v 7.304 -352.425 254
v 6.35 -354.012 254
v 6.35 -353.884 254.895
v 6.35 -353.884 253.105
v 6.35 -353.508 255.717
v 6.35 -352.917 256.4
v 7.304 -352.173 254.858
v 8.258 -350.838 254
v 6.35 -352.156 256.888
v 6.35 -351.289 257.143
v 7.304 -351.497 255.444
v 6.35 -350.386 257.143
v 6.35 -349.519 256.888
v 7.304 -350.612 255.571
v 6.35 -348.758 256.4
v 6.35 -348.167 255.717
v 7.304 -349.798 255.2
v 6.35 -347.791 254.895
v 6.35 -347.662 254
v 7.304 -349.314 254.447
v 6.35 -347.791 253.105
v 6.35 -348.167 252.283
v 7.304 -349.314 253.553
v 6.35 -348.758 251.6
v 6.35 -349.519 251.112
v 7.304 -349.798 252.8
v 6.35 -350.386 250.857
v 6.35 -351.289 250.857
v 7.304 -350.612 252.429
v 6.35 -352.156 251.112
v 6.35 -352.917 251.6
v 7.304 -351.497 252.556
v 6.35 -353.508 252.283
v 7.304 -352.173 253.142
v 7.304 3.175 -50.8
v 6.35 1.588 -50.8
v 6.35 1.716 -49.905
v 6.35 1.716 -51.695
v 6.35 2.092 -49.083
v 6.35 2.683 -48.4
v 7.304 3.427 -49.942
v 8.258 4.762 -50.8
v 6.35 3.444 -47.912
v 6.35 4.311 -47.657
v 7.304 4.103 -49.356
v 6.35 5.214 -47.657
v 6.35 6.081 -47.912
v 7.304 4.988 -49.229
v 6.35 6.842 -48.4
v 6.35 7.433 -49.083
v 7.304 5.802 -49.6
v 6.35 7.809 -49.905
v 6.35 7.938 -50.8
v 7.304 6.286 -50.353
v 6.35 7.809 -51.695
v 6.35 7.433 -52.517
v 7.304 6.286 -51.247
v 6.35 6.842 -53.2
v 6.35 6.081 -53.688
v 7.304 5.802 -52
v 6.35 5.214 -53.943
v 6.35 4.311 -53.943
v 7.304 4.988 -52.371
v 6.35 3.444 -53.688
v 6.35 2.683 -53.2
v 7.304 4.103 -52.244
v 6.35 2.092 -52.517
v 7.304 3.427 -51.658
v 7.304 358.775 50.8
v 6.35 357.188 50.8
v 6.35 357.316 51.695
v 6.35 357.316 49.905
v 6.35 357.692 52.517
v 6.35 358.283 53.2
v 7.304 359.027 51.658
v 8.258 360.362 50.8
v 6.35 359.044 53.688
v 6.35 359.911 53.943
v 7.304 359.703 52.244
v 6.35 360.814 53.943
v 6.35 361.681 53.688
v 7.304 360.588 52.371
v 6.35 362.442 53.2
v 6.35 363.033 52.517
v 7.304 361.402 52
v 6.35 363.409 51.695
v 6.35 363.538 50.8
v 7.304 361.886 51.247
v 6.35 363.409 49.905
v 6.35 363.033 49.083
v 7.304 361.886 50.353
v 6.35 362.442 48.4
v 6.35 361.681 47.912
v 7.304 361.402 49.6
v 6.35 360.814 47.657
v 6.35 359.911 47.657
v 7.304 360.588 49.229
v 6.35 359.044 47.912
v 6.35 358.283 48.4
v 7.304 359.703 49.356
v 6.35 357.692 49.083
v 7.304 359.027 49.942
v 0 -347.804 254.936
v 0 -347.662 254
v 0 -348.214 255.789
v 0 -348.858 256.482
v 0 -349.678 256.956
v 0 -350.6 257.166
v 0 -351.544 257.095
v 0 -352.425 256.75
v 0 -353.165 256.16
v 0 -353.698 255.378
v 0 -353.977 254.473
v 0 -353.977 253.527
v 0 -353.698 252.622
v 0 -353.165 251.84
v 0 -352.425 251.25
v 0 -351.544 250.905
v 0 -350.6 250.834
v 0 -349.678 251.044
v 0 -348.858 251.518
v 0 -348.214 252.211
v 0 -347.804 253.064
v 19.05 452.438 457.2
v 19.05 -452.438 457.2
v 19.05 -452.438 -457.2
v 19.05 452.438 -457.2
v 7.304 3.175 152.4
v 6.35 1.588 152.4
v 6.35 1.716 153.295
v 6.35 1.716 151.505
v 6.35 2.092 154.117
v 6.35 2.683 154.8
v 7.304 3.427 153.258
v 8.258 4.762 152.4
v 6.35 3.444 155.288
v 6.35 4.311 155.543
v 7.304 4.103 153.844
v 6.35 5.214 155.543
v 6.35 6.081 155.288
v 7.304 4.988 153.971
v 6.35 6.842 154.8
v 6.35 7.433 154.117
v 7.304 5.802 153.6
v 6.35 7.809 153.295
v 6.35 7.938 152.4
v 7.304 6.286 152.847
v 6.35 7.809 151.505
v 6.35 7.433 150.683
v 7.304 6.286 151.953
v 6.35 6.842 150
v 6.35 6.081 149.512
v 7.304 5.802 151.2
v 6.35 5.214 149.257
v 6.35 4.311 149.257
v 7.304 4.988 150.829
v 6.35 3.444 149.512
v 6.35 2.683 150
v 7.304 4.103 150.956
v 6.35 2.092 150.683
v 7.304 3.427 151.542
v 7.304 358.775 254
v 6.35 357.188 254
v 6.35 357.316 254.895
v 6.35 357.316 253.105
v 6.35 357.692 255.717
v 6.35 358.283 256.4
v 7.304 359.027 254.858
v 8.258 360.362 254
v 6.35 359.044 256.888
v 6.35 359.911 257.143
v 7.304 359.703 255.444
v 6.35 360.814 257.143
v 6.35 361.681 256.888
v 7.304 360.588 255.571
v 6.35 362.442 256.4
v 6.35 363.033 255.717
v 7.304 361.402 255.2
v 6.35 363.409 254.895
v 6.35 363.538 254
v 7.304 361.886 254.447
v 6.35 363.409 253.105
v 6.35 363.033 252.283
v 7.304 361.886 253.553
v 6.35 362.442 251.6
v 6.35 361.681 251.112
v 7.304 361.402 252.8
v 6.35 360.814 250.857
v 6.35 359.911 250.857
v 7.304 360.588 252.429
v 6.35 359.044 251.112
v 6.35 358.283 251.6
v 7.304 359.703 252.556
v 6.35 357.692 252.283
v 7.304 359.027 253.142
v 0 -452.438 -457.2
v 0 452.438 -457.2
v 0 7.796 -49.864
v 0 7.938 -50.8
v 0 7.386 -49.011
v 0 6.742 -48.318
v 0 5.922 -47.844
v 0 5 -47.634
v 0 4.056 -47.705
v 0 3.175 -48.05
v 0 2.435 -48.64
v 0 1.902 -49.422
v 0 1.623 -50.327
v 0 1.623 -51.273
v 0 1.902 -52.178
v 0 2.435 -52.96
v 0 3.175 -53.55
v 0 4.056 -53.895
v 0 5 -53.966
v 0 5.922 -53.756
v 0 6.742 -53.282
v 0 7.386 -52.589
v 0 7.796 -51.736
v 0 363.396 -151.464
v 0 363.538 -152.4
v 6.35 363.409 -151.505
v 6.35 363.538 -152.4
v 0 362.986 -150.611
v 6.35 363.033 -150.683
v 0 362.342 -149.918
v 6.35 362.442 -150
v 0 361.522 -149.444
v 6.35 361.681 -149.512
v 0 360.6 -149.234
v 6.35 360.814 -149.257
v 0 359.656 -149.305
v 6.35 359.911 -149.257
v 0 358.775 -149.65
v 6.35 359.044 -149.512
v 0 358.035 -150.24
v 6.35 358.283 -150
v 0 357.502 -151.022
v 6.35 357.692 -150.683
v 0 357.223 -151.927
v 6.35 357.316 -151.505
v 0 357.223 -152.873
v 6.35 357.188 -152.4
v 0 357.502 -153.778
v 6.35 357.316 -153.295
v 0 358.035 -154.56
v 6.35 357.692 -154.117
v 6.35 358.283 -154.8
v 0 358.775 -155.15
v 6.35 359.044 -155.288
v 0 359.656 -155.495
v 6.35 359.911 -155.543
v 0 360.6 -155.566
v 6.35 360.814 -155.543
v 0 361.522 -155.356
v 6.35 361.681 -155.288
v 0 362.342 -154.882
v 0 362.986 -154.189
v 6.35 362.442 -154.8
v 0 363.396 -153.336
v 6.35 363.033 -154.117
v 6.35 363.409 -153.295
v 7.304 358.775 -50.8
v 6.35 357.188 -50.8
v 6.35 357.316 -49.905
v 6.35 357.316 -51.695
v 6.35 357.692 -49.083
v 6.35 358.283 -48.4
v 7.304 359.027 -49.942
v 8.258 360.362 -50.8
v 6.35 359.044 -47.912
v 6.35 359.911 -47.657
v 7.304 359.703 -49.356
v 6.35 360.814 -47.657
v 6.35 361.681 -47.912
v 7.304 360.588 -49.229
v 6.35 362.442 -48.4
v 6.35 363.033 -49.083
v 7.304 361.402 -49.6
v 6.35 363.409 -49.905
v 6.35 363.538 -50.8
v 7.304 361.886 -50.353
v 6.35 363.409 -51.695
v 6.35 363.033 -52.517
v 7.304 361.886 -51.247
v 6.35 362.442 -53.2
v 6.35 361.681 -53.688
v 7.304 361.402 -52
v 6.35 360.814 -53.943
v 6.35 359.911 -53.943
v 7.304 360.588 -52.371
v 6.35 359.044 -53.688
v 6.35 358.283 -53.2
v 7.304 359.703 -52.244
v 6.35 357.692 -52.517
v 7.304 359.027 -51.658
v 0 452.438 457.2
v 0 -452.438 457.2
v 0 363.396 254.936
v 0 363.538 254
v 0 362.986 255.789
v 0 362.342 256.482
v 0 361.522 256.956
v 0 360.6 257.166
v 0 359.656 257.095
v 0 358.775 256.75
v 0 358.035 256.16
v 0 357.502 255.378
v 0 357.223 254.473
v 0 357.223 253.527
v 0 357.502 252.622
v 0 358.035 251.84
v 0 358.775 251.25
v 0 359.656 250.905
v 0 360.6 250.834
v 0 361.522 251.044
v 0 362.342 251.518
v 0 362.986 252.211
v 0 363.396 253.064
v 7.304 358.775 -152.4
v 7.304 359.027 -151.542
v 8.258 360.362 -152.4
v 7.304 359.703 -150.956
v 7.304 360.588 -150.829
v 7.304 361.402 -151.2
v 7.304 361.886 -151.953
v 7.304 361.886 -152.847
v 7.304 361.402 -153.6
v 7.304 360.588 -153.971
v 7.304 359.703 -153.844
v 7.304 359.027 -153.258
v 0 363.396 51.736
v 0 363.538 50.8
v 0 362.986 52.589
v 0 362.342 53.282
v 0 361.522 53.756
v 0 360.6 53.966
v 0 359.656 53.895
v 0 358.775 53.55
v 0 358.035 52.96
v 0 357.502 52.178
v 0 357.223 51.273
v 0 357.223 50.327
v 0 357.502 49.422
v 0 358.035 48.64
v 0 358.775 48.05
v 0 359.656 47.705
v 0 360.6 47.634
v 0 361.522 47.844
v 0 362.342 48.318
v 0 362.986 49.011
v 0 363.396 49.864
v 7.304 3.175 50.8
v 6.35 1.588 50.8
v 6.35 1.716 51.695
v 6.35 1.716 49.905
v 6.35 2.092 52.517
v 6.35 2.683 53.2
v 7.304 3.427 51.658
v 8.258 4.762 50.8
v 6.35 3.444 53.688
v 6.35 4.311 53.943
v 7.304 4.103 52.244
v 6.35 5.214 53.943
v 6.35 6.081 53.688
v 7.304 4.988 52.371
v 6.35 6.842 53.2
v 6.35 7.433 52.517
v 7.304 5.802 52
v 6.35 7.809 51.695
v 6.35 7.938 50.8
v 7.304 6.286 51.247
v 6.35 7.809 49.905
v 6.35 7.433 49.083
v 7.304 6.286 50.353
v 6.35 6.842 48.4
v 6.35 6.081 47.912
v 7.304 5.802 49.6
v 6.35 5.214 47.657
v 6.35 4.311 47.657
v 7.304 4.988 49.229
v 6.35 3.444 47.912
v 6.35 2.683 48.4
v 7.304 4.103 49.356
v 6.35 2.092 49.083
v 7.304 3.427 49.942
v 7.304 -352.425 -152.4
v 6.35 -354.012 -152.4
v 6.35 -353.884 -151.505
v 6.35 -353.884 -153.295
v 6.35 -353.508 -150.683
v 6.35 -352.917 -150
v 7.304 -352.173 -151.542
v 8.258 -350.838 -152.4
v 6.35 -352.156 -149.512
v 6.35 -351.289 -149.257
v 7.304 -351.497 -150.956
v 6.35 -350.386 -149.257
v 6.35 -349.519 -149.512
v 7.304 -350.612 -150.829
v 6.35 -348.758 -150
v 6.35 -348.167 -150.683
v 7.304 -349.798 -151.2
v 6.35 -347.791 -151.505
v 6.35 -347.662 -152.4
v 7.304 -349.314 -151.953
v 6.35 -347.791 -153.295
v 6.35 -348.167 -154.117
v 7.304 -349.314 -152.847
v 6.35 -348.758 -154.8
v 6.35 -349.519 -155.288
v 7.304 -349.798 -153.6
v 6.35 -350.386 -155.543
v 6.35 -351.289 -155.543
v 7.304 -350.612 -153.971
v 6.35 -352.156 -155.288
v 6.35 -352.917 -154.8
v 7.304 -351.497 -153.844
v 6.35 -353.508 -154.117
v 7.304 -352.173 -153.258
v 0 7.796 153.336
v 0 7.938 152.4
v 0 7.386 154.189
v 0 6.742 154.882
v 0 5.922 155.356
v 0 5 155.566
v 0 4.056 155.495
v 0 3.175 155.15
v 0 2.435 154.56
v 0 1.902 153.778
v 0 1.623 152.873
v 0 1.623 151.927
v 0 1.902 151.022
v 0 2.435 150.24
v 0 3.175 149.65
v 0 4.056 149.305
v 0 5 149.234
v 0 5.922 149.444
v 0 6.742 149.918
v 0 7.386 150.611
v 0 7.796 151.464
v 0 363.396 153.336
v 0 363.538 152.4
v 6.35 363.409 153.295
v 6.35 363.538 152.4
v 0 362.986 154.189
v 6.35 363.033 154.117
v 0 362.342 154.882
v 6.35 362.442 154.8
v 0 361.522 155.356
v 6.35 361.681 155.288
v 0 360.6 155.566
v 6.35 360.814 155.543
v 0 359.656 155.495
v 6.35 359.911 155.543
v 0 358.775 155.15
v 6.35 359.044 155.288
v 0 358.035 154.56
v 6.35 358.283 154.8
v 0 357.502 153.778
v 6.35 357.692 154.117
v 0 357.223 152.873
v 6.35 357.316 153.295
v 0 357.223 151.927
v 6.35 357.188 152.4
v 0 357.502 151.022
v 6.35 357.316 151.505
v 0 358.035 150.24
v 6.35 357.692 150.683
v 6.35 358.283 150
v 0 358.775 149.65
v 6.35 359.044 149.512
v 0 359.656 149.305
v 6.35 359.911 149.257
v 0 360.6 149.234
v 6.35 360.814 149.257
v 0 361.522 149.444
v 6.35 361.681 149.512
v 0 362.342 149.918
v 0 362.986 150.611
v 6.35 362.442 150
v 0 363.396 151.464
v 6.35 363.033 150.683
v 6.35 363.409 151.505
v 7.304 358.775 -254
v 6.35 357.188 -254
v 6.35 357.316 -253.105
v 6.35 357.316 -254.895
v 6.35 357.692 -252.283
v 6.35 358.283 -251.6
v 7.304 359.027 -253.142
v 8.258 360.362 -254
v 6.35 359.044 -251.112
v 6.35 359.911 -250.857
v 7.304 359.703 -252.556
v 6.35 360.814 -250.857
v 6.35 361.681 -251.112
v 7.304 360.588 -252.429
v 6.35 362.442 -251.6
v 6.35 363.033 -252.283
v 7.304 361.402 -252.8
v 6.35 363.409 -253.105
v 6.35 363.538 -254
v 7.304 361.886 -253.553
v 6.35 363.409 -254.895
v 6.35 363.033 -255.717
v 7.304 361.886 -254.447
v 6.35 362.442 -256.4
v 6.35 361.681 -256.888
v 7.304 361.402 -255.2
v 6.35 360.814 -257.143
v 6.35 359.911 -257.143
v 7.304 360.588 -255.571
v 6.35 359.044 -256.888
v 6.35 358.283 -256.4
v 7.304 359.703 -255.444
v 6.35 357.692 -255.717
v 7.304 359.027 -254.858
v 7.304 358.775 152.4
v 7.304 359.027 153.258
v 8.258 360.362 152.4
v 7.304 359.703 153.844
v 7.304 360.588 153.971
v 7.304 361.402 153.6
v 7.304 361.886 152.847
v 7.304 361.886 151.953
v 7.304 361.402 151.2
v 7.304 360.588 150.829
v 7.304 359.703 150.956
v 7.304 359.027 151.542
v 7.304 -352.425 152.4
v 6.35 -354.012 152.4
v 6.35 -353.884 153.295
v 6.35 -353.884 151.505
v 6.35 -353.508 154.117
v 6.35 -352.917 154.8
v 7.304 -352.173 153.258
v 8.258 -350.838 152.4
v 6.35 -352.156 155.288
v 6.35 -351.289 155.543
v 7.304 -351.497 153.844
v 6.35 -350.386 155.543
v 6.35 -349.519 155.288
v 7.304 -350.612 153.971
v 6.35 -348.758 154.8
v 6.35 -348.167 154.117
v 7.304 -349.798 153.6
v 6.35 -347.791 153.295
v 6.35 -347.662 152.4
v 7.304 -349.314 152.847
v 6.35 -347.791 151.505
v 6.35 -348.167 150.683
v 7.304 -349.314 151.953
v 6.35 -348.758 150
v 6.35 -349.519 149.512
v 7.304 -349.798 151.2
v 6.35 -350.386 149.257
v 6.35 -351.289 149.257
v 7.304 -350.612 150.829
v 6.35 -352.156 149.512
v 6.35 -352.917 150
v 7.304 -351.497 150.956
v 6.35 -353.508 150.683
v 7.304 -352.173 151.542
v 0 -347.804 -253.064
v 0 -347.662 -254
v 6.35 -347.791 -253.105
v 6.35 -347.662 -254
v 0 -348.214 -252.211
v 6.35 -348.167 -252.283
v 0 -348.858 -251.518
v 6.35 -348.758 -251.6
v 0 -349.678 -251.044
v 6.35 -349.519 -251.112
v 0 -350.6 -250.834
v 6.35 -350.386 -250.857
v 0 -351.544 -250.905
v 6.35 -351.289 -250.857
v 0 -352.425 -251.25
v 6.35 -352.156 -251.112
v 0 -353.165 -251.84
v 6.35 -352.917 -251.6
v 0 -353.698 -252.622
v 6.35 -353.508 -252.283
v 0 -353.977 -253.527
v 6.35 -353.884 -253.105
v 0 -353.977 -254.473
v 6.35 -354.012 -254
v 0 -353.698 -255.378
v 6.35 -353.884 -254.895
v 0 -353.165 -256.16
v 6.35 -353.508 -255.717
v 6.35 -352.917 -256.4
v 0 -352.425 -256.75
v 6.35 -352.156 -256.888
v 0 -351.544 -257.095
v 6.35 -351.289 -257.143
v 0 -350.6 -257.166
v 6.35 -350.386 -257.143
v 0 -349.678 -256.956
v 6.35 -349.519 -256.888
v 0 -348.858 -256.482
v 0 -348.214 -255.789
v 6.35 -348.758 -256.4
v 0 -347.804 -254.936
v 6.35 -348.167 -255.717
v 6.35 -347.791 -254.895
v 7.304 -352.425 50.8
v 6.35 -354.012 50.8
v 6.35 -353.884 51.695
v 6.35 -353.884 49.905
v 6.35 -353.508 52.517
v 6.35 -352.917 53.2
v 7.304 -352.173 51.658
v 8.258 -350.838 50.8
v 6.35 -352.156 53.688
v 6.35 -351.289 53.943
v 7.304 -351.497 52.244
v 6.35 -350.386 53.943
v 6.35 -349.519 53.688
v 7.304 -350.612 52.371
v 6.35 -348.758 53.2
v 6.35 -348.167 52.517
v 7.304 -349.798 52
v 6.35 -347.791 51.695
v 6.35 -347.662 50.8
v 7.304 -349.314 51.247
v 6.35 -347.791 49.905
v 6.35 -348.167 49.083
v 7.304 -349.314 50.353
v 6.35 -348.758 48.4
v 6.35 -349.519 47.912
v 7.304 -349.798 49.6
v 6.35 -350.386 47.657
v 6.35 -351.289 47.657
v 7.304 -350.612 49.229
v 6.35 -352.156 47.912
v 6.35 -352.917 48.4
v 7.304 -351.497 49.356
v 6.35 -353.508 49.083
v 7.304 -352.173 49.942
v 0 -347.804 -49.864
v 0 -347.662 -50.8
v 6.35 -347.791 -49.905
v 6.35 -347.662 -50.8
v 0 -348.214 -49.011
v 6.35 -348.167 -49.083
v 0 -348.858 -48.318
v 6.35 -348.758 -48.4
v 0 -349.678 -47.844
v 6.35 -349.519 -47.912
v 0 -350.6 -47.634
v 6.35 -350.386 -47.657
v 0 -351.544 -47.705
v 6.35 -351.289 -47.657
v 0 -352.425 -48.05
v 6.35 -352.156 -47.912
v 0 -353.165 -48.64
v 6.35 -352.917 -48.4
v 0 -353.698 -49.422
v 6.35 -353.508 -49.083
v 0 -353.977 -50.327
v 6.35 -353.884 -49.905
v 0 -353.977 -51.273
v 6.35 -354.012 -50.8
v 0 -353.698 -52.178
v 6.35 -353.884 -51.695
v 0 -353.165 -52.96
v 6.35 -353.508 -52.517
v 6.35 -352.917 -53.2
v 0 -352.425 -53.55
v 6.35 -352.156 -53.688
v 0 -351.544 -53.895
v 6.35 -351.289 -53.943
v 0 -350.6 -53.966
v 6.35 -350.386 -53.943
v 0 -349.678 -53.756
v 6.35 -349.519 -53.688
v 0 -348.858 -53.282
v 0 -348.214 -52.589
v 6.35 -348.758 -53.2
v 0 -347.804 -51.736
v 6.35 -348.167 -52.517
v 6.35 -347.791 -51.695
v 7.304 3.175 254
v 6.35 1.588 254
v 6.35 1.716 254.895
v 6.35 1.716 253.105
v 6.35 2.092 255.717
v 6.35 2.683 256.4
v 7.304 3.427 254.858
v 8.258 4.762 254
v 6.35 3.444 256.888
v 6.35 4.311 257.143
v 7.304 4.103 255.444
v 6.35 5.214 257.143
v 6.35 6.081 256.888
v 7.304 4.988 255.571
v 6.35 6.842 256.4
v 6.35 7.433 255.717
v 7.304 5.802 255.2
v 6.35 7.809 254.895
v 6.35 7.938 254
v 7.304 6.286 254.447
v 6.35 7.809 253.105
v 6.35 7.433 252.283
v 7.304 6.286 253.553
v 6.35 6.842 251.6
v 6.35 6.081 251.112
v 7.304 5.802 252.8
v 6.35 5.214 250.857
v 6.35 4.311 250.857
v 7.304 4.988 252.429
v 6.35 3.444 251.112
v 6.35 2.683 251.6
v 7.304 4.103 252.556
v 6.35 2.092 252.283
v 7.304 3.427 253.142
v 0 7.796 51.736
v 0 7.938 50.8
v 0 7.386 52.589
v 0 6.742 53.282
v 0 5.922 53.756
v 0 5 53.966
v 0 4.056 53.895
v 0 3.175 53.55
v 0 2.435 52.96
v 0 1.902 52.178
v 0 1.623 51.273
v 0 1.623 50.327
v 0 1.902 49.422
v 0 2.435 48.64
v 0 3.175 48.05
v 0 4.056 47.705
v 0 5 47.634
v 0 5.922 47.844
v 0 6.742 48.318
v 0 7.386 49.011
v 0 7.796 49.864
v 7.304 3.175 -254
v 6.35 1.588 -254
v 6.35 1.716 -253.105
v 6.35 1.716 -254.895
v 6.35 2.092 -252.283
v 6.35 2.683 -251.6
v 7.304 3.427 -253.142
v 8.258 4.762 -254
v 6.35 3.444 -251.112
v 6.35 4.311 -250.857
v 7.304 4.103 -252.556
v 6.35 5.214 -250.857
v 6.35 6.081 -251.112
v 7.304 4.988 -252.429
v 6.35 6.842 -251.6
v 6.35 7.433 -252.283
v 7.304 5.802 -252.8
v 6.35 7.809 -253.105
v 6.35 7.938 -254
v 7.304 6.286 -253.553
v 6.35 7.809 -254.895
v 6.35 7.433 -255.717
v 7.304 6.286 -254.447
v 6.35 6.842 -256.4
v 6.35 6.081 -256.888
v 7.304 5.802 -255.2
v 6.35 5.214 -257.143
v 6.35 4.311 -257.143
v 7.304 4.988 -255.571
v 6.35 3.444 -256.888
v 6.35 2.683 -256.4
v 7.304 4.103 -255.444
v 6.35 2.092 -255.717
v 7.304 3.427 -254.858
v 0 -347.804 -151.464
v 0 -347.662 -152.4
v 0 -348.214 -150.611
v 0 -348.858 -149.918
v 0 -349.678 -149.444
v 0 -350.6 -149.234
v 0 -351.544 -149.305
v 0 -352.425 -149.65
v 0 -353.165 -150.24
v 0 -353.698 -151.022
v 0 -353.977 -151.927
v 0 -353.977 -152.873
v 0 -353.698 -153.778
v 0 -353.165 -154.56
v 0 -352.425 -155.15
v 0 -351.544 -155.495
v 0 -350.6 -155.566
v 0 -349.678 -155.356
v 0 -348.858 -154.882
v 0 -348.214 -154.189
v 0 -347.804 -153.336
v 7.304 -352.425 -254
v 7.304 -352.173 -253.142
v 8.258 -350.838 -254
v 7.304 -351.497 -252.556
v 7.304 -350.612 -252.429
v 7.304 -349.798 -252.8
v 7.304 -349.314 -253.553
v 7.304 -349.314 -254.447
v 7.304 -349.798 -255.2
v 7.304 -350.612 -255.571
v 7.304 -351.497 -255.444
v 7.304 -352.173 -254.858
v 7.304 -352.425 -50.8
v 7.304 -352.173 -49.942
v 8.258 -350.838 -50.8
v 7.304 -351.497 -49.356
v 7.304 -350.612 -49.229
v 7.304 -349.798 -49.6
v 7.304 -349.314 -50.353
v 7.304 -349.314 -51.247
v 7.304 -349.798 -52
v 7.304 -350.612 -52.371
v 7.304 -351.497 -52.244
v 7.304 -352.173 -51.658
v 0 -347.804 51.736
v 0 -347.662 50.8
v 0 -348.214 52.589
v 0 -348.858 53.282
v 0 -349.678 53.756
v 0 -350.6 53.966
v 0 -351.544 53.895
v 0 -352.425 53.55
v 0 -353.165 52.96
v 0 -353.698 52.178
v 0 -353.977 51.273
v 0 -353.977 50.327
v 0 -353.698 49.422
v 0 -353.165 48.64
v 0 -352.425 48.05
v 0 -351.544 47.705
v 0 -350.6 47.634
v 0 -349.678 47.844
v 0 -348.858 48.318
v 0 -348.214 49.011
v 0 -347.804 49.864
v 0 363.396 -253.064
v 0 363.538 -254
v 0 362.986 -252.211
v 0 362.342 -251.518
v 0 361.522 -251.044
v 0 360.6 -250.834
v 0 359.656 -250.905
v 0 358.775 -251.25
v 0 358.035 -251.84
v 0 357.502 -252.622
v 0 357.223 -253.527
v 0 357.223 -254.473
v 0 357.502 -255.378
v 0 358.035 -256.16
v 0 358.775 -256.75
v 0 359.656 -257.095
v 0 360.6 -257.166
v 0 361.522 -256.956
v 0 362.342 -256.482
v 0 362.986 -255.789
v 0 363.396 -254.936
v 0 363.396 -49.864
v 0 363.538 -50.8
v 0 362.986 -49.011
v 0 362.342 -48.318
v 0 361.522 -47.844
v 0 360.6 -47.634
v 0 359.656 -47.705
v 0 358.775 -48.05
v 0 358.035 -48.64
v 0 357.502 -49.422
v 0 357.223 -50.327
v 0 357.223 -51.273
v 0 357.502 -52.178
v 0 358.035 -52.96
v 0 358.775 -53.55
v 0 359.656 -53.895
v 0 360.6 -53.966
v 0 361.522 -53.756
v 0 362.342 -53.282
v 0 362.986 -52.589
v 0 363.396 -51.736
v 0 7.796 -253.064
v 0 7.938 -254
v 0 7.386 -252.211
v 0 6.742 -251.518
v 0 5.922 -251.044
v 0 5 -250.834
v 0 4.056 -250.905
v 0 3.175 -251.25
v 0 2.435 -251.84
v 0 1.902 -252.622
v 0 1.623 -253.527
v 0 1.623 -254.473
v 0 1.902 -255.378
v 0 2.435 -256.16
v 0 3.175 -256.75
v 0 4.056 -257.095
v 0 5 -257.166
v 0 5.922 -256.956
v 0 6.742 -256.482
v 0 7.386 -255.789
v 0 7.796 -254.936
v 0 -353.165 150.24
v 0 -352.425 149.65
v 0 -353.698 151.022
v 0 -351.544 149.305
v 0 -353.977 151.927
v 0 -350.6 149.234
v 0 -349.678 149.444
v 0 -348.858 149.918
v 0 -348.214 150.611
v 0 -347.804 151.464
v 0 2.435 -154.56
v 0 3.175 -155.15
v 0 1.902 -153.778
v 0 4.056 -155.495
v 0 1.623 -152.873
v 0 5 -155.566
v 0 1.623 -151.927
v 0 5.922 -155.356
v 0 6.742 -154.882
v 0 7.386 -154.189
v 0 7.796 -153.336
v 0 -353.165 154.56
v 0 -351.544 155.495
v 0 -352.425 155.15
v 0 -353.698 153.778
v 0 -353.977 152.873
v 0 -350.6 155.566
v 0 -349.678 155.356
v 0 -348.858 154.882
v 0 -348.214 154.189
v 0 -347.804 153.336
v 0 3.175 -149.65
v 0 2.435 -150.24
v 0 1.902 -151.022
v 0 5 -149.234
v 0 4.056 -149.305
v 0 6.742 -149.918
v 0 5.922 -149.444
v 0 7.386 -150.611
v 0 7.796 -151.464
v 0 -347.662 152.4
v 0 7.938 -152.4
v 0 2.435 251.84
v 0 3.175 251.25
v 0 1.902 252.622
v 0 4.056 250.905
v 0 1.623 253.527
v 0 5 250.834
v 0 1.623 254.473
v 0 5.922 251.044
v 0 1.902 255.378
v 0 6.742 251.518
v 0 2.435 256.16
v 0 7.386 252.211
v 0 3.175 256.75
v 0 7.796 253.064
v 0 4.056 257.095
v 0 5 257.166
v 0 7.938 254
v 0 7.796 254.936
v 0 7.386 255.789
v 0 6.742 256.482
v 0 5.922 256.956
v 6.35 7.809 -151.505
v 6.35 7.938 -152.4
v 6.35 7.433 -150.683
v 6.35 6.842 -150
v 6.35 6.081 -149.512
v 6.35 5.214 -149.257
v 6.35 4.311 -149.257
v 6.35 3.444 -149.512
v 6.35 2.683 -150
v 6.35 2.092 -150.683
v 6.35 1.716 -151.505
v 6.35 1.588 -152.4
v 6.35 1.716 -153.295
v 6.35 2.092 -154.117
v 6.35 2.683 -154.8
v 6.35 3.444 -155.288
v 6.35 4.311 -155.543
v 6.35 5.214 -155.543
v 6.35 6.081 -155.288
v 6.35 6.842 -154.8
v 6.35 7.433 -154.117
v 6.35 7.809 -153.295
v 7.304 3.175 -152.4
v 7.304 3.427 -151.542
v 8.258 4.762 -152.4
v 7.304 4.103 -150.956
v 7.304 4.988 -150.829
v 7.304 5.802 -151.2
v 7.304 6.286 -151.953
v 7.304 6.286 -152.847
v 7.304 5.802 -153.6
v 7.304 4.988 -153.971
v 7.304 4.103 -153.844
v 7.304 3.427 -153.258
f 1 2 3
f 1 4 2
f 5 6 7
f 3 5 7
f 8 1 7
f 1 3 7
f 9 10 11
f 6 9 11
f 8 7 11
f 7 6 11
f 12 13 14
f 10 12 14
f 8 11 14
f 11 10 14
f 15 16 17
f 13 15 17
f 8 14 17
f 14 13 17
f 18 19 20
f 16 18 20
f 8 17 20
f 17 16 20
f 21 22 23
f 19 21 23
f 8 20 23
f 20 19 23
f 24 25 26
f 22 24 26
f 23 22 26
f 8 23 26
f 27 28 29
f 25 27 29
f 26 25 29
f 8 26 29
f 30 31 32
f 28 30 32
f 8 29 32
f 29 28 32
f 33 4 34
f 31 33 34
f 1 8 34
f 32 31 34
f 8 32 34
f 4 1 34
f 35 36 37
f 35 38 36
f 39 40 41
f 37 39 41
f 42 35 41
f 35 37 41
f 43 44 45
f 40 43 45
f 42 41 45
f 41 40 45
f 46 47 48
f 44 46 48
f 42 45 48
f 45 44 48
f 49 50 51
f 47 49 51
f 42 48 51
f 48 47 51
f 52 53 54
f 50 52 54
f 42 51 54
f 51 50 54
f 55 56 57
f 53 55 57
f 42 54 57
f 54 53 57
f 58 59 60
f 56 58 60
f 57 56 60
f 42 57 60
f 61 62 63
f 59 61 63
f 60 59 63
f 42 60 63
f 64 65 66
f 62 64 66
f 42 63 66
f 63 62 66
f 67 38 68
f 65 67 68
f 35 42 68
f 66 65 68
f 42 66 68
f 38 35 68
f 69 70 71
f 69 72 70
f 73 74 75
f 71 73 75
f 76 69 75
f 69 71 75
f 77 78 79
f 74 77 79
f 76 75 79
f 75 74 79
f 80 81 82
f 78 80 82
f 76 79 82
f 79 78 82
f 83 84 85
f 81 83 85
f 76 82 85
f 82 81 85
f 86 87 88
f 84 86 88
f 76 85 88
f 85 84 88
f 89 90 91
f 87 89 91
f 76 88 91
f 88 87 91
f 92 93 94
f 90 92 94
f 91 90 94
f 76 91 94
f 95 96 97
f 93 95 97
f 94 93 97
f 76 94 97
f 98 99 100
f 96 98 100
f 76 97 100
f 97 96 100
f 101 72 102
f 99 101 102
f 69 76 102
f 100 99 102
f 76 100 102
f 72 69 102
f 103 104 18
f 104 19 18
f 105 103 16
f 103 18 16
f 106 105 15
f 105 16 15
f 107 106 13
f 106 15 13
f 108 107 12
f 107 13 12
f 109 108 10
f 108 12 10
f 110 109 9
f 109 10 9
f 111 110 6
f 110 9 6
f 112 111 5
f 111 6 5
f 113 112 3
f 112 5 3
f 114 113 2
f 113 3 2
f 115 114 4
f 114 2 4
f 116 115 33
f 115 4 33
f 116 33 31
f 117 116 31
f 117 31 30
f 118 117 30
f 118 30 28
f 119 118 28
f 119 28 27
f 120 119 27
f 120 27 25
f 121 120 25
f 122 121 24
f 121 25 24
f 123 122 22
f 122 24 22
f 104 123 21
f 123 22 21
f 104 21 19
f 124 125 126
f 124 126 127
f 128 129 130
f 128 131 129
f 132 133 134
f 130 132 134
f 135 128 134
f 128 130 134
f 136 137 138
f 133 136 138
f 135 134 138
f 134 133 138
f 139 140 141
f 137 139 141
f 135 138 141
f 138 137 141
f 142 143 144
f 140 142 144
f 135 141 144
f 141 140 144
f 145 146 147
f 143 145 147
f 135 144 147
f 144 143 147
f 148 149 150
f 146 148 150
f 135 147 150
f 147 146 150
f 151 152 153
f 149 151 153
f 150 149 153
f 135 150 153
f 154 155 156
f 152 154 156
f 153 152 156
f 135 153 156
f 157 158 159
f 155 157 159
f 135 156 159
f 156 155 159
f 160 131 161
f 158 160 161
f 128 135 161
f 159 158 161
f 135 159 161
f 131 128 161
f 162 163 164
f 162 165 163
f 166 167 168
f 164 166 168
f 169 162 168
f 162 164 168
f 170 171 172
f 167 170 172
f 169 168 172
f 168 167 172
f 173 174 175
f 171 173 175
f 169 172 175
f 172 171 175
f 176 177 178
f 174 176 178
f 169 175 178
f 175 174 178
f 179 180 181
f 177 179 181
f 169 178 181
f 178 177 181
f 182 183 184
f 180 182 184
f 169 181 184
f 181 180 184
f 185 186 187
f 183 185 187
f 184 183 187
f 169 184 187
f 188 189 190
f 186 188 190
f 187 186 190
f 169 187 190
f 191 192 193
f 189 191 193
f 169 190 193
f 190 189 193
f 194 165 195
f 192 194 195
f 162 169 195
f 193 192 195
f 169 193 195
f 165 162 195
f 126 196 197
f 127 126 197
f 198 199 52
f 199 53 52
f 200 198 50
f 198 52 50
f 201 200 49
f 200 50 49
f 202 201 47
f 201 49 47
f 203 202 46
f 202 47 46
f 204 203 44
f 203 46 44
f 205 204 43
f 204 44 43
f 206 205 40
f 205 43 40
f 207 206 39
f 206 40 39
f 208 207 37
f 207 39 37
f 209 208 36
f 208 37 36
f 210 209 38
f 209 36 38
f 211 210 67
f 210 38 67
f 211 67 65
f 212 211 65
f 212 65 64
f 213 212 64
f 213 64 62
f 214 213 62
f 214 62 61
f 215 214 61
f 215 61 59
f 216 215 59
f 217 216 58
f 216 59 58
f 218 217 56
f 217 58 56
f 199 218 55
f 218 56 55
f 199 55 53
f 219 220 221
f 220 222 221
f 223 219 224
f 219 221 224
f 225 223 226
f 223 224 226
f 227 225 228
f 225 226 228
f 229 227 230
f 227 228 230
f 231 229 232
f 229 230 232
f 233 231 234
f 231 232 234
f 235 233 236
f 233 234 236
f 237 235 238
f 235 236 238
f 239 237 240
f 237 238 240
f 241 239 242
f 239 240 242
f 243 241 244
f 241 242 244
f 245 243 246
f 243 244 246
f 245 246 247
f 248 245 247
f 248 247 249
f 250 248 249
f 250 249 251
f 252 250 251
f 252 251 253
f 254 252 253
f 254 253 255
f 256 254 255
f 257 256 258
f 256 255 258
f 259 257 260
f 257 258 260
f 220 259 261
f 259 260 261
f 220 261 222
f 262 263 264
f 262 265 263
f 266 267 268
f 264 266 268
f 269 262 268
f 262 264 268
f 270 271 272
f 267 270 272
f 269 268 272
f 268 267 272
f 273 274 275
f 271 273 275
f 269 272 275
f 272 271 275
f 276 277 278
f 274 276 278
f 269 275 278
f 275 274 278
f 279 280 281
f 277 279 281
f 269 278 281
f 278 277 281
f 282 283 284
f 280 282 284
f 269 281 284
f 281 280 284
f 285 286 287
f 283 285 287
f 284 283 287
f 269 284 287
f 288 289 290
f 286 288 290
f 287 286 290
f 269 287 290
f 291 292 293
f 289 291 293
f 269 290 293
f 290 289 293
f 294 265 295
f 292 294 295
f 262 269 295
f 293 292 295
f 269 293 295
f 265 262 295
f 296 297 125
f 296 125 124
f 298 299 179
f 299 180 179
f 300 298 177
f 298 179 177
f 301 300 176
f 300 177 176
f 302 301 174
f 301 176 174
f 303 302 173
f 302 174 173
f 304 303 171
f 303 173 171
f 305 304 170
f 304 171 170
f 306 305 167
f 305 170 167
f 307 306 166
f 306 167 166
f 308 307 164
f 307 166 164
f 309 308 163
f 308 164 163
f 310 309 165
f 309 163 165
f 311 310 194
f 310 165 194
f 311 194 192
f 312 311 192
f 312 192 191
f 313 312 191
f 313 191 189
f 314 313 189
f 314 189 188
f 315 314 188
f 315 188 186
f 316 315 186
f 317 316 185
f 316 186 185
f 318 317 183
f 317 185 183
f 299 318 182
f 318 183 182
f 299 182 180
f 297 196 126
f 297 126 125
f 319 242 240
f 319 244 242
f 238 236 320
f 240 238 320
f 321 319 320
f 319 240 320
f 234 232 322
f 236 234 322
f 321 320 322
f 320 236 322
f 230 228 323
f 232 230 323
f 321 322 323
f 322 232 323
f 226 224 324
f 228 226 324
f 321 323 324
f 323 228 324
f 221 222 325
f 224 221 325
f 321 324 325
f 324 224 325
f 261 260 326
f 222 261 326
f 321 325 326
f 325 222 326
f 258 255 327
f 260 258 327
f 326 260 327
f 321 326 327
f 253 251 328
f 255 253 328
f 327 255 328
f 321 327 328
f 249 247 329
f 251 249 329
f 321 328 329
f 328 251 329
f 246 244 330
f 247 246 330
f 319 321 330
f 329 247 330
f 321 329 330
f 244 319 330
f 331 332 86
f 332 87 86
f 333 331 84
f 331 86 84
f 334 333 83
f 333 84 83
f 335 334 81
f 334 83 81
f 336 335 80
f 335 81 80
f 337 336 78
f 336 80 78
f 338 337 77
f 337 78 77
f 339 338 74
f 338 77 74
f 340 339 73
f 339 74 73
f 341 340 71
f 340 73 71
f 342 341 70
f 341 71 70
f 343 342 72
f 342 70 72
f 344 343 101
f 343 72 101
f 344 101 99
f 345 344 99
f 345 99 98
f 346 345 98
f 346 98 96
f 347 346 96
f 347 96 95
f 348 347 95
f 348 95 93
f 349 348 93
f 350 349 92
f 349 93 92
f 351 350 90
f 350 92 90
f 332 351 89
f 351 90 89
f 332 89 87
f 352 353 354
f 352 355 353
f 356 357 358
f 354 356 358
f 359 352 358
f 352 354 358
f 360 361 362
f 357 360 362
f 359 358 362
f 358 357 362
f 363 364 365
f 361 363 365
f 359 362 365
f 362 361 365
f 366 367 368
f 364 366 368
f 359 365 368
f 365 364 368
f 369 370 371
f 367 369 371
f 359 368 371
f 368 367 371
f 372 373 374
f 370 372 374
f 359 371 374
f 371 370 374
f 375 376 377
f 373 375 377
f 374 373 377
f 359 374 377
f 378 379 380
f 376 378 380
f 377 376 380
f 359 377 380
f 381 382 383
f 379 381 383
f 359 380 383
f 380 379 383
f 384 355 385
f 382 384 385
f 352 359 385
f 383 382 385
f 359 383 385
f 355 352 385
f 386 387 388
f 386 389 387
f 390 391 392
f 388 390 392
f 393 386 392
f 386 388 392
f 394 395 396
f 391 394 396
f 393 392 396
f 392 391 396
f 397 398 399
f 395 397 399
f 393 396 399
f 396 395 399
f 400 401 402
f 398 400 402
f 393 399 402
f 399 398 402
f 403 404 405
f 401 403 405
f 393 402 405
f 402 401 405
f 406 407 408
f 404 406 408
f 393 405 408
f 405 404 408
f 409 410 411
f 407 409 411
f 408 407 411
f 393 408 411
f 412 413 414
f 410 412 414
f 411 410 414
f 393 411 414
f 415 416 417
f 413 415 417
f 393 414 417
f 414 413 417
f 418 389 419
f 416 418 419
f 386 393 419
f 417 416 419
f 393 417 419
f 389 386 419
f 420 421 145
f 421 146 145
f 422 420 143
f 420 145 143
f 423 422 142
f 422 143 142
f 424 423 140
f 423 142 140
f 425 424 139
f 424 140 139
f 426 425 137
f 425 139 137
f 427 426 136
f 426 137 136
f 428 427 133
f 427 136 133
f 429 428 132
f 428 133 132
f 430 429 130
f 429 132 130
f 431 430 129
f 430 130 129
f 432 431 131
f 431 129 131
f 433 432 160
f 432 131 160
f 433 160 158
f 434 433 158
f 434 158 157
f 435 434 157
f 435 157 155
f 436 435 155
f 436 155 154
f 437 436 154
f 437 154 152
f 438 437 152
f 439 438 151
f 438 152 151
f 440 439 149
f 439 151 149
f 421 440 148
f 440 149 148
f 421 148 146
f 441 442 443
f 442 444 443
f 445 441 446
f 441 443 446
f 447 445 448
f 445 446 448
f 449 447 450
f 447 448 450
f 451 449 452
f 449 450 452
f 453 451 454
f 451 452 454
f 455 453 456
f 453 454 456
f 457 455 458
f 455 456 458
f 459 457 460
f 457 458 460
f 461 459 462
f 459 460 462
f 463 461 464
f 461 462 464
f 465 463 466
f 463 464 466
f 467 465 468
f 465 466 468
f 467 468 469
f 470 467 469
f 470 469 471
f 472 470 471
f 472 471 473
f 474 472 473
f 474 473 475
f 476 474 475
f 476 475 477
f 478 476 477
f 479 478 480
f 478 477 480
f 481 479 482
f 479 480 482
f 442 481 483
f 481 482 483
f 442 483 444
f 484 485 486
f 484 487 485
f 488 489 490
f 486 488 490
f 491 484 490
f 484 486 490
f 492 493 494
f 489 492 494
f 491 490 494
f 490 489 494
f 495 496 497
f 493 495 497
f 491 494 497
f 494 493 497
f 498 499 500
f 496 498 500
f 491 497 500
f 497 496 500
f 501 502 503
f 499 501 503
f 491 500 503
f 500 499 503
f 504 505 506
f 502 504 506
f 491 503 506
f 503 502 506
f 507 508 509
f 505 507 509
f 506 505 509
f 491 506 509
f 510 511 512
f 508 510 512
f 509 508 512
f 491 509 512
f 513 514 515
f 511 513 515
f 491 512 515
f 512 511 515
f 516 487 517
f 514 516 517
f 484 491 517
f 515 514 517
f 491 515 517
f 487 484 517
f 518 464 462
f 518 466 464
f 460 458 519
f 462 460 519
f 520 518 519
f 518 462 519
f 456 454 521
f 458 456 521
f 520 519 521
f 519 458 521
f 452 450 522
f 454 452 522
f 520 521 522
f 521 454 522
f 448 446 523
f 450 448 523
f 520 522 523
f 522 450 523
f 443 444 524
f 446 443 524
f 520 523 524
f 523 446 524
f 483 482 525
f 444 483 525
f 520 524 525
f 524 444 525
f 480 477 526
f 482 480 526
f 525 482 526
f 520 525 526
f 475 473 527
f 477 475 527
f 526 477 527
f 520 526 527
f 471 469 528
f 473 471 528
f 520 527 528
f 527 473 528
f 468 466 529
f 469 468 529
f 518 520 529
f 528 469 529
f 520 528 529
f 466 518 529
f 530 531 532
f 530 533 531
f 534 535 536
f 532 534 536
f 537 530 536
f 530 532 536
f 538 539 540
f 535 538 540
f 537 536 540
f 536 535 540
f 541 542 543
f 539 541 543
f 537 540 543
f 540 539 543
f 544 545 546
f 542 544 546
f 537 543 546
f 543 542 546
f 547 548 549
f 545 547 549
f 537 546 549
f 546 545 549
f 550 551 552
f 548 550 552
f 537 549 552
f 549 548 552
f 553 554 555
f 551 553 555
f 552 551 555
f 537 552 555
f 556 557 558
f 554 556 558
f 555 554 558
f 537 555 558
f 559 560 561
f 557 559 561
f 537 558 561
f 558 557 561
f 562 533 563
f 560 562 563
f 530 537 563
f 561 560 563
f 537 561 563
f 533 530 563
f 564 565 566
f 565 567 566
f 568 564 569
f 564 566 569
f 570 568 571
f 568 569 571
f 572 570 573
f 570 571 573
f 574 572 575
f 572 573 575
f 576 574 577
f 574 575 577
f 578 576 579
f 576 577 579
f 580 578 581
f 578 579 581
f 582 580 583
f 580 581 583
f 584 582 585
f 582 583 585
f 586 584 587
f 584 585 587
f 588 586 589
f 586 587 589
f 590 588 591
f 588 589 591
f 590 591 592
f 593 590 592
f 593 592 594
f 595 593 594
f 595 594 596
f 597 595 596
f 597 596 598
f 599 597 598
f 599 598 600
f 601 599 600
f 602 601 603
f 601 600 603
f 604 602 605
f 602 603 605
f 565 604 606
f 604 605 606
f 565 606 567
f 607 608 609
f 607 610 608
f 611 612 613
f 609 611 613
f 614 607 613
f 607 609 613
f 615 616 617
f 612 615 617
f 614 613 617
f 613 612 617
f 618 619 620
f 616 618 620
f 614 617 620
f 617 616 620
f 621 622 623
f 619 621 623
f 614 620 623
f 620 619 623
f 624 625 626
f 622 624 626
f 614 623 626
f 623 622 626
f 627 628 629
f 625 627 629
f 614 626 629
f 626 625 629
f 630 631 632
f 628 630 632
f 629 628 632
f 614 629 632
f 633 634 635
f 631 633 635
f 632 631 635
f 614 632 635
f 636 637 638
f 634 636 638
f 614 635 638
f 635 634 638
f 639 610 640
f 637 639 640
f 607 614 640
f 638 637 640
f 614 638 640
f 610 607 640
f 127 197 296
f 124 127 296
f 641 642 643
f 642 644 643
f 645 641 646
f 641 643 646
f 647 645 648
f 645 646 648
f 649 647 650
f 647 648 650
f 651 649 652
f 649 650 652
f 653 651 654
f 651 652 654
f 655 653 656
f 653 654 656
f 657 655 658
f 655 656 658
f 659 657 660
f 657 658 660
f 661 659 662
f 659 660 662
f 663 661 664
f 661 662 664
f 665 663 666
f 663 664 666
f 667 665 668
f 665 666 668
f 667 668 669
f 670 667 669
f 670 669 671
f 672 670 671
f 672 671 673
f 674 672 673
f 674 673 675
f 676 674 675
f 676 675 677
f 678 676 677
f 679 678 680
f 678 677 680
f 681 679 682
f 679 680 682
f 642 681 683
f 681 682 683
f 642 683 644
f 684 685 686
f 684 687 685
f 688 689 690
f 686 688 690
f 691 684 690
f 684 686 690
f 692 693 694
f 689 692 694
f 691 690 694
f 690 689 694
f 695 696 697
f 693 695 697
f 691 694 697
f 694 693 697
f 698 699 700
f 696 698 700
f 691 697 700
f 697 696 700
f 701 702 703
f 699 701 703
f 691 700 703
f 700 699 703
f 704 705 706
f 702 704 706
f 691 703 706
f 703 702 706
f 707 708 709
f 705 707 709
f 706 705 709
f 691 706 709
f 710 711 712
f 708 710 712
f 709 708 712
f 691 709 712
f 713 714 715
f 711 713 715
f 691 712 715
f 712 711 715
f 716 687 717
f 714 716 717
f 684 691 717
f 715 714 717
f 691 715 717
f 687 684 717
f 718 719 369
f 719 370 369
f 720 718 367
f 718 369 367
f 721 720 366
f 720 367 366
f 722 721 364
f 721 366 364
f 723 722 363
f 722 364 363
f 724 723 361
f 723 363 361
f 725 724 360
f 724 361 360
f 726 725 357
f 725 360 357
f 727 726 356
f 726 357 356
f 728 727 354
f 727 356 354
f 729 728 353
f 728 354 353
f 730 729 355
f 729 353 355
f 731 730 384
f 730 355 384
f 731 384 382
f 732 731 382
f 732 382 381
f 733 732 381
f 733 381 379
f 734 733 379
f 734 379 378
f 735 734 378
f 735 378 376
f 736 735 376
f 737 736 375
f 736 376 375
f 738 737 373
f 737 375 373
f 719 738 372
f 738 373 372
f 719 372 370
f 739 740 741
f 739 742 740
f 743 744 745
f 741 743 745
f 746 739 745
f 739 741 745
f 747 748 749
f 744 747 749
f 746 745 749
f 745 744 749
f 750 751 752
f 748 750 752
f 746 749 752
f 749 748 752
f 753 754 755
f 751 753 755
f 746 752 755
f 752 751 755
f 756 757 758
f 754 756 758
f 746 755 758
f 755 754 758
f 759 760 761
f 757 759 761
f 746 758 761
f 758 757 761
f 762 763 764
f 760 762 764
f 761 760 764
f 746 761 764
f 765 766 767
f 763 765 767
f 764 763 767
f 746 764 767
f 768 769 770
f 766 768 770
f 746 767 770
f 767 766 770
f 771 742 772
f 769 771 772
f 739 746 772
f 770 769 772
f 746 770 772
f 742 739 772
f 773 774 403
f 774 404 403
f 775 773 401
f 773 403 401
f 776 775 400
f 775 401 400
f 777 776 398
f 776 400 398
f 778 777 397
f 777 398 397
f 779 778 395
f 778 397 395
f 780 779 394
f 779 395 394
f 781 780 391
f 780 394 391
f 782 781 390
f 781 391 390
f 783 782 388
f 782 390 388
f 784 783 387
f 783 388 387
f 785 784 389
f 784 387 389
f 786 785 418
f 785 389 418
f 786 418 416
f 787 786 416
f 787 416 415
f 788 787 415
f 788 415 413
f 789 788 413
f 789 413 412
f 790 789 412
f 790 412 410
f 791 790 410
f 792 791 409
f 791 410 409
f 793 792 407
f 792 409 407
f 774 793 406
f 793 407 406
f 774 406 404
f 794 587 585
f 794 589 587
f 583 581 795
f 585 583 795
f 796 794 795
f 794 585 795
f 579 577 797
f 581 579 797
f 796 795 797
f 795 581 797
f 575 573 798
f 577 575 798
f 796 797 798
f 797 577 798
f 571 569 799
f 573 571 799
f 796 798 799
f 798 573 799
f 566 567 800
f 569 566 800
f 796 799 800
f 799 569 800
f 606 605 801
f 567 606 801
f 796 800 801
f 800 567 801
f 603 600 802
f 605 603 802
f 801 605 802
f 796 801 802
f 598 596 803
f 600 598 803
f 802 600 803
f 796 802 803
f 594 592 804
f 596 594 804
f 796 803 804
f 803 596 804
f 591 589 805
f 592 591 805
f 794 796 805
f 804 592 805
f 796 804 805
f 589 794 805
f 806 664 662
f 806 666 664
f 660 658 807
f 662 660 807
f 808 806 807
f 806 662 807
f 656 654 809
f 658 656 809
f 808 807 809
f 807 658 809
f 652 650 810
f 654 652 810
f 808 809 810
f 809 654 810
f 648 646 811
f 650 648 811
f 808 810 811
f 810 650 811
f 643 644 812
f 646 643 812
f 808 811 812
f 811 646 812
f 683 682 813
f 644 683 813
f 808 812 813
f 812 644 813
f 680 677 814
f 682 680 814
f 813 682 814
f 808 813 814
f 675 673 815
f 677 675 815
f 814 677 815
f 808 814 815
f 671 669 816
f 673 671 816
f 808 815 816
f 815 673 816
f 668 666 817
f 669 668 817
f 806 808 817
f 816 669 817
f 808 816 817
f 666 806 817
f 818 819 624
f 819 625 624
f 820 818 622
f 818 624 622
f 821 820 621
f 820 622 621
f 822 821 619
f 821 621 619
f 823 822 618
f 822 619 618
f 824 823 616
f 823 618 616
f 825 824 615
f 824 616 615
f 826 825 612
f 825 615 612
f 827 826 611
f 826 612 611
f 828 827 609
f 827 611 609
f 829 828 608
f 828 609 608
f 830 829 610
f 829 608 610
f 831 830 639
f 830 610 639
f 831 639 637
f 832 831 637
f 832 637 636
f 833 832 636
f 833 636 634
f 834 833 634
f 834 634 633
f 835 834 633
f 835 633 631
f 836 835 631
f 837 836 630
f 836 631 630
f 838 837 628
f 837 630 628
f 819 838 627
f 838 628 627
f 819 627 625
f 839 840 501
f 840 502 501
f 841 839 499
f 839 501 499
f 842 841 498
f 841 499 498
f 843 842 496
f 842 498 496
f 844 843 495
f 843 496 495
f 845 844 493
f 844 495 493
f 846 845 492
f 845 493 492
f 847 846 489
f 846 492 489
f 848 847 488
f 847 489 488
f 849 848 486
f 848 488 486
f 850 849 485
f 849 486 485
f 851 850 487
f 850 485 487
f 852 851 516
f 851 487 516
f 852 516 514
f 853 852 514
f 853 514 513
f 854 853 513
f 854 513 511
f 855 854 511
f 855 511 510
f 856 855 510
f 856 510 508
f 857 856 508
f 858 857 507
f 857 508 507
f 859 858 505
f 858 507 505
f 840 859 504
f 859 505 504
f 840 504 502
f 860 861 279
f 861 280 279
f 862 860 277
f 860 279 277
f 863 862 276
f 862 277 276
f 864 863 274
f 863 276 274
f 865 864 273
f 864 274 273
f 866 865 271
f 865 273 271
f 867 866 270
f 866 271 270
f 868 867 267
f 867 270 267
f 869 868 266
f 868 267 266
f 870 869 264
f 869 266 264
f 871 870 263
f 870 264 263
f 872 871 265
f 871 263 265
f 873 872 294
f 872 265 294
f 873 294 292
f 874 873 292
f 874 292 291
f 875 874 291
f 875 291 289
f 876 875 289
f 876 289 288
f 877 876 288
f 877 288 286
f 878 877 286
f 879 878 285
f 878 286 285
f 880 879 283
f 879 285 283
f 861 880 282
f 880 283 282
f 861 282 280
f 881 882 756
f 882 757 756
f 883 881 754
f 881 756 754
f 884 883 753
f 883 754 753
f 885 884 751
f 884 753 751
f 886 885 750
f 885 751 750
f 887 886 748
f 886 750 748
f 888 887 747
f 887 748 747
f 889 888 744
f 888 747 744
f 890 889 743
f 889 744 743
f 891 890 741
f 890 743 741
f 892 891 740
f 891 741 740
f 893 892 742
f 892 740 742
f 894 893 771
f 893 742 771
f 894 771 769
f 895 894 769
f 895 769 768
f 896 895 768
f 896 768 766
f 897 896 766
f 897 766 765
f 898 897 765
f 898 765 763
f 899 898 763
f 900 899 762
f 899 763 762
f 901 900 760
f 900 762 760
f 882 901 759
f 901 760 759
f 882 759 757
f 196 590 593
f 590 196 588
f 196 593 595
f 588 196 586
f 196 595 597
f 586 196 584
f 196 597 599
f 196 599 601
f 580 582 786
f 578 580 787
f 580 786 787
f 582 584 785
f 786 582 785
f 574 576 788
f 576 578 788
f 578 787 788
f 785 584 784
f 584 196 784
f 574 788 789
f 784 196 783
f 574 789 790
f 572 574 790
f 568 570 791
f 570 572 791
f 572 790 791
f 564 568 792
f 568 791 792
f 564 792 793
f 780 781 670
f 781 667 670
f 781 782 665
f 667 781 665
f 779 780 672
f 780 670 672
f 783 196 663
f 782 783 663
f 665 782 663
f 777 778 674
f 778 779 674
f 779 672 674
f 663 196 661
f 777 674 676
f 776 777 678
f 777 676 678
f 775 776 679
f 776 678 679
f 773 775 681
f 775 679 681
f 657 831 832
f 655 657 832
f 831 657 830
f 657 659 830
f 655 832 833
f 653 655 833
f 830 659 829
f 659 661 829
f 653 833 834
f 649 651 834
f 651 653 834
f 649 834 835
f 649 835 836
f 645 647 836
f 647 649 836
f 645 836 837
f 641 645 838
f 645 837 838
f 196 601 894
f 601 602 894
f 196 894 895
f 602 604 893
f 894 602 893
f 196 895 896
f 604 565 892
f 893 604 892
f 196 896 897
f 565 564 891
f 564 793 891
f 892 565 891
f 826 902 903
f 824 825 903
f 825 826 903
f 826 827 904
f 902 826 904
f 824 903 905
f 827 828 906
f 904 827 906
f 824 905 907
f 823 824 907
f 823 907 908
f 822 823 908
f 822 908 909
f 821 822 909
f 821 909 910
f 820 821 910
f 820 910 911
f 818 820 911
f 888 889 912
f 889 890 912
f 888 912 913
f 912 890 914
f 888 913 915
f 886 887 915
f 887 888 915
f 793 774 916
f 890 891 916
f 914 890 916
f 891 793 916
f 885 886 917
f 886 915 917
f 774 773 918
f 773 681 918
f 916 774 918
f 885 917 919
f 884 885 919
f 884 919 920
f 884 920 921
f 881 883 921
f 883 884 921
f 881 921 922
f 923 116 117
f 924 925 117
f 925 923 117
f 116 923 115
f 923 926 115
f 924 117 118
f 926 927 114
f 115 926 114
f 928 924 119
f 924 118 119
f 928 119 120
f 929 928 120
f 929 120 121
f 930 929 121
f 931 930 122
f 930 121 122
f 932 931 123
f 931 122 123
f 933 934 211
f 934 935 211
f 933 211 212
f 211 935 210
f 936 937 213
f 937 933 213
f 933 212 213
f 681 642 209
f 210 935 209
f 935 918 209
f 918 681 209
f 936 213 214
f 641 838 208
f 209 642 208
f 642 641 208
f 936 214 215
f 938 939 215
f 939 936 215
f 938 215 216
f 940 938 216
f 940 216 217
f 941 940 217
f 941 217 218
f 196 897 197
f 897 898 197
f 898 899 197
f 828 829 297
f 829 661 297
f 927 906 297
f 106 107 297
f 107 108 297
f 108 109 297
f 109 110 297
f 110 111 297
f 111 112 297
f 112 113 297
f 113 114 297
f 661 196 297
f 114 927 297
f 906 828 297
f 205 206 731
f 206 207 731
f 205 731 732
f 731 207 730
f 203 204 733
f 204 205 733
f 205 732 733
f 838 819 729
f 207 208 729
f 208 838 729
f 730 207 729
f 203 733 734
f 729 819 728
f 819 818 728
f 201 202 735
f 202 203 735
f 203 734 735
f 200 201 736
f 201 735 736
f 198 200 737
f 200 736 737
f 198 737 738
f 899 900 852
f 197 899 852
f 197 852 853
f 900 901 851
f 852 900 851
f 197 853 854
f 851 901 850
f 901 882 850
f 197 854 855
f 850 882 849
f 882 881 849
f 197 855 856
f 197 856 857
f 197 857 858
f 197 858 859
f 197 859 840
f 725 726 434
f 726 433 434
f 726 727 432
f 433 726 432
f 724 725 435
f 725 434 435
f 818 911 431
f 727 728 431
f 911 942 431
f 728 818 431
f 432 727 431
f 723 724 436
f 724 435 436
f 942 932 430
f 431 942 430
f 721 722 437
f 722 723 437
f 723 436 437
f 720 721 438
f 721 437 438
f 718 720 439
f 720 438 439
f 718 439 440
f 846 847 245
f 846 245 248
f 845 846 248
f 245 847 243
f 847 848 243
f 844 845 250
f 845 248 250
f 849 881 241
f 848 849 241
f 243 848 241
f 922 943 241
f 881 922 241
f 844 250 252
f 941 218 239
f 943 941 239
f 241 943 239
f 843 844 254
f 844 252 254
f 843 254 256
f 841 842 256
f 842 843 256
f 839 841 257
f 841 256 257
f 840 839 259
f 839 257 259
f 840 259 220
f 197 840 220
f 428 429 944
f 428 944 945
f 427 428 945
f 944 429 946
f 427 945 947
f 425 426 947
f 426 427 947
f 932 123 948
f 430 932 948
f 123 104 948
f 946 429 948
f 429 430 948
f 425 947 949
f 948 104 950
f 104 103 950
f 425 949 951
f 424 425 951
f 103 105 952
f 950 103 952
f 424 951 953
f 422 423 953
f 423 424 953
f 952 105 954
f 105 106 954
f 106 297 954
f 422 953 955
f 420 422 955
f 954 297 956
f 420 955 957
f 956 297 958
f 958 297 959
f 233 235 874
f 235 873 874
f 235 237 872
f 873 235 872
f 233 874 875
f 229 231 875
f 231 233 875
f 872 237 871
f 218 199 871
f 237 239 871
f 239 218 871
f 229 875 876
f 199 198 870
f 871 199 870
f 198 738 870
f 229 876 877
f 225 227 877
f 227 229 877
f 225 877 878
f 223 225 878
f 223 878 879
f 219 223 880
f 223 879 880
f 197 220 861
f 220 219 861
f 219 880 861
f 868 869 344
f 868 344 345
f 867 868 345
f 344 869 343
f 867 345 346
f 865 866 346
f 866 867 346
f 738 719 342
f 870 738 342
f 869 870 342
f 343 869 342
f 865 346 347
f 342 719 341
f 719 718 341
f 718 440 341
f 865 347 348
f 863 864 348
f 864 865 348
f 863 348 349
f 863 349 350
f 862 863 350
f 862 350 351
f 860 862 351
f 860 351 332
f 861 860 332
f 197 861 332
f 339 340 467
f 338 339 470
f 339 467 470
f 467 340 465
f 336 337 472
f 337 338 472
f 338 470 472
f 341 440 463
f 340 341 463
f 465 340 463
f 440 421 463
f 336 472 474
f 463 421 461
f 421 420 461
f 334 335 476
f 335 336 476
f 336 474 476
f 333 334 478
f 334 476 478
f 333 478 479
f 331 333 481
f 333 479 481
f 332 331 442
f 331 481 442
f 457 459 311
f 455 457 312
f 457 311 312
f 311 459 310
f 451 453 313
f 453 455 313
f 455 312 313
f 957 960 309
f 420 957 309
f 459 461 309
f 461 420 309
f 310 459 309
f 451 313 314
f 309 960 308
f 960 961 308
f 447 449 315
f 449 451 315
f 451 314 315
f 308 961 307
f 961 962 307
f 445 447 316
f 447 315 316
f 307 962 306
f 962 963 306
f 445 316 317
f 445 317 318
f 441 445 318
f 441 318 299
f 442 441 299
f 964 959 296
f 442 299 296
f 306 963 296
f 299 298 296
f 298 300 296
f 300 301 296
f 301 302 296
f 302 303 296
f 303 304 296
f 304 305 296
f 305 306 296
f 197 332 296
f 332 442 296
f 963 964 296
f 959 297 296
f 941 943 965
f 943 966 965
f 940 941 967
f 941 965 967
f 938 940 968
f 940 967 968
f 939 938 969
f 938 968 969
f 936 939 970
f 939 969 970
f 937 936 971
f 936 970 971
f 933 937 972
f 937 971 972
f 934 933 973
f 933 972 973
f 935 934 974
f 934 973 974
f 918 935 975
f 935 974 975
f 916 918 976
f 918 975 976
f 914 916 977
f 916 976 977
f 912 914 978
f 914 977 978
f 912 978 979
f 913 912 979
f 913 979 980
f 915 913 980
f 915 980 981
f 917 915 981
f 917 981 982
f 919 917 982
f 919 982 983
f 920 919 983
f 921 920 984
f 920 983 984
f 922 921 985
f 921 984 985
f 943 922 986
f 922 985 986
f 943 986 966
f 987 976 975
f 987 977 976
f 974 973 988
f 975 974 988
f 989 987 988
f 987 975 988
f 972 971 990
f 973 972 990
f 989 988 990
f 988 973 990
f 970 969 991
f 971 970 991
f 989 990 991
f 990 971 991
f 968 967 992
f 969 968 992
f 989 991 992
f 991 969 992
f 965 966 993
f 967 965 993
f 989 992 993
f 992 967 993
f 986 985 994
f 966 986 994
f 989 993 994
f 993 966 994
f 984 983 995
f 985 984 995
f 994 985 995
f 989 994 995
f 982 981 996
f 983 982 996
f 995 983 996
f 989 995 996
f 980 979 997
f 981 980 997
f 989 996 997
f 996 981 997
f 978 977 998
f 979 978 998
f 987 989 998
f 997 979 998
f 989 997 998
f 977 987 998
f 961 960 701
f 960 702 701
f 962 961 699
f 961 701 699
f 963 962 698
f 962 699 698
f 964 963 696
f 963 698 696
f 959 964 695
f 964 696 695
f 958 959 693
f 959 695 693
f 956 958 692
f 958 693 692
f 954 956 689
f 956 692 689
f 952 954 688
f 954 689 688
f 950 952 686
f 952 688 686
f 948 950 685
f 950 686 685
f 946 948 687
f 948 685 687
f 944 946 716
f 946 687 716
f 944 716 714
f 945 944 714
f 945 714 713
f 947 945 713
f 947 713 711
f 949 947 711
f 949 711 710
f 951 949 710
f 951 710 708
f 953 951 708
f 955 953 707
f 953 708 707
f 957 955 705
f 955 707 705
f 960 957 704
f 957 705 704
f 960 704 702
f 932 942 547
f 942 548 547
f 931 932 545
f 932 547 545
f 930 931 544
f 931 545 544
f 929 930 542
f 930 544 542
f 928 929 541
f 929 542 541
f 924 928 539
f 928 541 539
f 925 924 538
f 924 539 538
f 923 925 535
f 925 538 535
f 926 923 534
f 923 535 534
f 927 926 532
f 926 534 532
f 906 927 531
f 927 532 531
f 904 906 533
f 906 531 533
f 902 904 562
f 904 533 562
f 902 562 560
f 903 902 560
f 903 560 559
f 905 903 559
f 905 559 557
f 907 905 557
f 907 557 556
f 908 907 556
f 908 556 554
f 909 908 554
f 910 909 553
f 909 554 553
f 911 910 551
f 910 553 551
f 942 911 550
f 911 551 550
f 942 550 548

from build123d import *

# Parameters (mm, degrees)
F0_W     = 904.875
F0_H     = 914.4
F1_DEPTH = 19.05
F3_D     = 6.35
F3_DEPTH = 6.35
F3_TIP   = 1.9077324654


with BuildPart() as f1:
    # F0 (on Right) → F1 (new body)
    with BuildSketch(Plane.YZ):
        Rectangle(F0_W, F0_H)
    extrude(amount=F1_DEPTH)

    # F3
    with Locations(Plane(origin=(0, 0, 0), x_dir=(0, -1, 0), z_dir=(-1, 0, 0))):
        with Locations((-360.3625, 152.4), (350.8375, 152.4), (-4.7625, 152.4), (-360.3625, -254), (-360.3625, -50.8), (-4.7625, 50.8), (350.8375, 254), (350.8375, -152.4), (350.8375, 50.8), (-4.7625, 254), (-4.7625, -50.8), (-360.3625, 50.8), (-360.3625, 254), (350.8375, -254), (-4.7625, -254), (-4.7625, -152.4), (350.8375, -50.8), (-360.3625, -152.4)):
            Hole(F3_D / 2, depth=F3_DEPTH)
            with Locations((0, 0, -(F3_DEPTH + F3_TIP / 2))):  # 118° drill point
                Cone(0, F3_D / 2, F3_TIP, mode=Mode.SUBTRACT)


solid = f1.part
